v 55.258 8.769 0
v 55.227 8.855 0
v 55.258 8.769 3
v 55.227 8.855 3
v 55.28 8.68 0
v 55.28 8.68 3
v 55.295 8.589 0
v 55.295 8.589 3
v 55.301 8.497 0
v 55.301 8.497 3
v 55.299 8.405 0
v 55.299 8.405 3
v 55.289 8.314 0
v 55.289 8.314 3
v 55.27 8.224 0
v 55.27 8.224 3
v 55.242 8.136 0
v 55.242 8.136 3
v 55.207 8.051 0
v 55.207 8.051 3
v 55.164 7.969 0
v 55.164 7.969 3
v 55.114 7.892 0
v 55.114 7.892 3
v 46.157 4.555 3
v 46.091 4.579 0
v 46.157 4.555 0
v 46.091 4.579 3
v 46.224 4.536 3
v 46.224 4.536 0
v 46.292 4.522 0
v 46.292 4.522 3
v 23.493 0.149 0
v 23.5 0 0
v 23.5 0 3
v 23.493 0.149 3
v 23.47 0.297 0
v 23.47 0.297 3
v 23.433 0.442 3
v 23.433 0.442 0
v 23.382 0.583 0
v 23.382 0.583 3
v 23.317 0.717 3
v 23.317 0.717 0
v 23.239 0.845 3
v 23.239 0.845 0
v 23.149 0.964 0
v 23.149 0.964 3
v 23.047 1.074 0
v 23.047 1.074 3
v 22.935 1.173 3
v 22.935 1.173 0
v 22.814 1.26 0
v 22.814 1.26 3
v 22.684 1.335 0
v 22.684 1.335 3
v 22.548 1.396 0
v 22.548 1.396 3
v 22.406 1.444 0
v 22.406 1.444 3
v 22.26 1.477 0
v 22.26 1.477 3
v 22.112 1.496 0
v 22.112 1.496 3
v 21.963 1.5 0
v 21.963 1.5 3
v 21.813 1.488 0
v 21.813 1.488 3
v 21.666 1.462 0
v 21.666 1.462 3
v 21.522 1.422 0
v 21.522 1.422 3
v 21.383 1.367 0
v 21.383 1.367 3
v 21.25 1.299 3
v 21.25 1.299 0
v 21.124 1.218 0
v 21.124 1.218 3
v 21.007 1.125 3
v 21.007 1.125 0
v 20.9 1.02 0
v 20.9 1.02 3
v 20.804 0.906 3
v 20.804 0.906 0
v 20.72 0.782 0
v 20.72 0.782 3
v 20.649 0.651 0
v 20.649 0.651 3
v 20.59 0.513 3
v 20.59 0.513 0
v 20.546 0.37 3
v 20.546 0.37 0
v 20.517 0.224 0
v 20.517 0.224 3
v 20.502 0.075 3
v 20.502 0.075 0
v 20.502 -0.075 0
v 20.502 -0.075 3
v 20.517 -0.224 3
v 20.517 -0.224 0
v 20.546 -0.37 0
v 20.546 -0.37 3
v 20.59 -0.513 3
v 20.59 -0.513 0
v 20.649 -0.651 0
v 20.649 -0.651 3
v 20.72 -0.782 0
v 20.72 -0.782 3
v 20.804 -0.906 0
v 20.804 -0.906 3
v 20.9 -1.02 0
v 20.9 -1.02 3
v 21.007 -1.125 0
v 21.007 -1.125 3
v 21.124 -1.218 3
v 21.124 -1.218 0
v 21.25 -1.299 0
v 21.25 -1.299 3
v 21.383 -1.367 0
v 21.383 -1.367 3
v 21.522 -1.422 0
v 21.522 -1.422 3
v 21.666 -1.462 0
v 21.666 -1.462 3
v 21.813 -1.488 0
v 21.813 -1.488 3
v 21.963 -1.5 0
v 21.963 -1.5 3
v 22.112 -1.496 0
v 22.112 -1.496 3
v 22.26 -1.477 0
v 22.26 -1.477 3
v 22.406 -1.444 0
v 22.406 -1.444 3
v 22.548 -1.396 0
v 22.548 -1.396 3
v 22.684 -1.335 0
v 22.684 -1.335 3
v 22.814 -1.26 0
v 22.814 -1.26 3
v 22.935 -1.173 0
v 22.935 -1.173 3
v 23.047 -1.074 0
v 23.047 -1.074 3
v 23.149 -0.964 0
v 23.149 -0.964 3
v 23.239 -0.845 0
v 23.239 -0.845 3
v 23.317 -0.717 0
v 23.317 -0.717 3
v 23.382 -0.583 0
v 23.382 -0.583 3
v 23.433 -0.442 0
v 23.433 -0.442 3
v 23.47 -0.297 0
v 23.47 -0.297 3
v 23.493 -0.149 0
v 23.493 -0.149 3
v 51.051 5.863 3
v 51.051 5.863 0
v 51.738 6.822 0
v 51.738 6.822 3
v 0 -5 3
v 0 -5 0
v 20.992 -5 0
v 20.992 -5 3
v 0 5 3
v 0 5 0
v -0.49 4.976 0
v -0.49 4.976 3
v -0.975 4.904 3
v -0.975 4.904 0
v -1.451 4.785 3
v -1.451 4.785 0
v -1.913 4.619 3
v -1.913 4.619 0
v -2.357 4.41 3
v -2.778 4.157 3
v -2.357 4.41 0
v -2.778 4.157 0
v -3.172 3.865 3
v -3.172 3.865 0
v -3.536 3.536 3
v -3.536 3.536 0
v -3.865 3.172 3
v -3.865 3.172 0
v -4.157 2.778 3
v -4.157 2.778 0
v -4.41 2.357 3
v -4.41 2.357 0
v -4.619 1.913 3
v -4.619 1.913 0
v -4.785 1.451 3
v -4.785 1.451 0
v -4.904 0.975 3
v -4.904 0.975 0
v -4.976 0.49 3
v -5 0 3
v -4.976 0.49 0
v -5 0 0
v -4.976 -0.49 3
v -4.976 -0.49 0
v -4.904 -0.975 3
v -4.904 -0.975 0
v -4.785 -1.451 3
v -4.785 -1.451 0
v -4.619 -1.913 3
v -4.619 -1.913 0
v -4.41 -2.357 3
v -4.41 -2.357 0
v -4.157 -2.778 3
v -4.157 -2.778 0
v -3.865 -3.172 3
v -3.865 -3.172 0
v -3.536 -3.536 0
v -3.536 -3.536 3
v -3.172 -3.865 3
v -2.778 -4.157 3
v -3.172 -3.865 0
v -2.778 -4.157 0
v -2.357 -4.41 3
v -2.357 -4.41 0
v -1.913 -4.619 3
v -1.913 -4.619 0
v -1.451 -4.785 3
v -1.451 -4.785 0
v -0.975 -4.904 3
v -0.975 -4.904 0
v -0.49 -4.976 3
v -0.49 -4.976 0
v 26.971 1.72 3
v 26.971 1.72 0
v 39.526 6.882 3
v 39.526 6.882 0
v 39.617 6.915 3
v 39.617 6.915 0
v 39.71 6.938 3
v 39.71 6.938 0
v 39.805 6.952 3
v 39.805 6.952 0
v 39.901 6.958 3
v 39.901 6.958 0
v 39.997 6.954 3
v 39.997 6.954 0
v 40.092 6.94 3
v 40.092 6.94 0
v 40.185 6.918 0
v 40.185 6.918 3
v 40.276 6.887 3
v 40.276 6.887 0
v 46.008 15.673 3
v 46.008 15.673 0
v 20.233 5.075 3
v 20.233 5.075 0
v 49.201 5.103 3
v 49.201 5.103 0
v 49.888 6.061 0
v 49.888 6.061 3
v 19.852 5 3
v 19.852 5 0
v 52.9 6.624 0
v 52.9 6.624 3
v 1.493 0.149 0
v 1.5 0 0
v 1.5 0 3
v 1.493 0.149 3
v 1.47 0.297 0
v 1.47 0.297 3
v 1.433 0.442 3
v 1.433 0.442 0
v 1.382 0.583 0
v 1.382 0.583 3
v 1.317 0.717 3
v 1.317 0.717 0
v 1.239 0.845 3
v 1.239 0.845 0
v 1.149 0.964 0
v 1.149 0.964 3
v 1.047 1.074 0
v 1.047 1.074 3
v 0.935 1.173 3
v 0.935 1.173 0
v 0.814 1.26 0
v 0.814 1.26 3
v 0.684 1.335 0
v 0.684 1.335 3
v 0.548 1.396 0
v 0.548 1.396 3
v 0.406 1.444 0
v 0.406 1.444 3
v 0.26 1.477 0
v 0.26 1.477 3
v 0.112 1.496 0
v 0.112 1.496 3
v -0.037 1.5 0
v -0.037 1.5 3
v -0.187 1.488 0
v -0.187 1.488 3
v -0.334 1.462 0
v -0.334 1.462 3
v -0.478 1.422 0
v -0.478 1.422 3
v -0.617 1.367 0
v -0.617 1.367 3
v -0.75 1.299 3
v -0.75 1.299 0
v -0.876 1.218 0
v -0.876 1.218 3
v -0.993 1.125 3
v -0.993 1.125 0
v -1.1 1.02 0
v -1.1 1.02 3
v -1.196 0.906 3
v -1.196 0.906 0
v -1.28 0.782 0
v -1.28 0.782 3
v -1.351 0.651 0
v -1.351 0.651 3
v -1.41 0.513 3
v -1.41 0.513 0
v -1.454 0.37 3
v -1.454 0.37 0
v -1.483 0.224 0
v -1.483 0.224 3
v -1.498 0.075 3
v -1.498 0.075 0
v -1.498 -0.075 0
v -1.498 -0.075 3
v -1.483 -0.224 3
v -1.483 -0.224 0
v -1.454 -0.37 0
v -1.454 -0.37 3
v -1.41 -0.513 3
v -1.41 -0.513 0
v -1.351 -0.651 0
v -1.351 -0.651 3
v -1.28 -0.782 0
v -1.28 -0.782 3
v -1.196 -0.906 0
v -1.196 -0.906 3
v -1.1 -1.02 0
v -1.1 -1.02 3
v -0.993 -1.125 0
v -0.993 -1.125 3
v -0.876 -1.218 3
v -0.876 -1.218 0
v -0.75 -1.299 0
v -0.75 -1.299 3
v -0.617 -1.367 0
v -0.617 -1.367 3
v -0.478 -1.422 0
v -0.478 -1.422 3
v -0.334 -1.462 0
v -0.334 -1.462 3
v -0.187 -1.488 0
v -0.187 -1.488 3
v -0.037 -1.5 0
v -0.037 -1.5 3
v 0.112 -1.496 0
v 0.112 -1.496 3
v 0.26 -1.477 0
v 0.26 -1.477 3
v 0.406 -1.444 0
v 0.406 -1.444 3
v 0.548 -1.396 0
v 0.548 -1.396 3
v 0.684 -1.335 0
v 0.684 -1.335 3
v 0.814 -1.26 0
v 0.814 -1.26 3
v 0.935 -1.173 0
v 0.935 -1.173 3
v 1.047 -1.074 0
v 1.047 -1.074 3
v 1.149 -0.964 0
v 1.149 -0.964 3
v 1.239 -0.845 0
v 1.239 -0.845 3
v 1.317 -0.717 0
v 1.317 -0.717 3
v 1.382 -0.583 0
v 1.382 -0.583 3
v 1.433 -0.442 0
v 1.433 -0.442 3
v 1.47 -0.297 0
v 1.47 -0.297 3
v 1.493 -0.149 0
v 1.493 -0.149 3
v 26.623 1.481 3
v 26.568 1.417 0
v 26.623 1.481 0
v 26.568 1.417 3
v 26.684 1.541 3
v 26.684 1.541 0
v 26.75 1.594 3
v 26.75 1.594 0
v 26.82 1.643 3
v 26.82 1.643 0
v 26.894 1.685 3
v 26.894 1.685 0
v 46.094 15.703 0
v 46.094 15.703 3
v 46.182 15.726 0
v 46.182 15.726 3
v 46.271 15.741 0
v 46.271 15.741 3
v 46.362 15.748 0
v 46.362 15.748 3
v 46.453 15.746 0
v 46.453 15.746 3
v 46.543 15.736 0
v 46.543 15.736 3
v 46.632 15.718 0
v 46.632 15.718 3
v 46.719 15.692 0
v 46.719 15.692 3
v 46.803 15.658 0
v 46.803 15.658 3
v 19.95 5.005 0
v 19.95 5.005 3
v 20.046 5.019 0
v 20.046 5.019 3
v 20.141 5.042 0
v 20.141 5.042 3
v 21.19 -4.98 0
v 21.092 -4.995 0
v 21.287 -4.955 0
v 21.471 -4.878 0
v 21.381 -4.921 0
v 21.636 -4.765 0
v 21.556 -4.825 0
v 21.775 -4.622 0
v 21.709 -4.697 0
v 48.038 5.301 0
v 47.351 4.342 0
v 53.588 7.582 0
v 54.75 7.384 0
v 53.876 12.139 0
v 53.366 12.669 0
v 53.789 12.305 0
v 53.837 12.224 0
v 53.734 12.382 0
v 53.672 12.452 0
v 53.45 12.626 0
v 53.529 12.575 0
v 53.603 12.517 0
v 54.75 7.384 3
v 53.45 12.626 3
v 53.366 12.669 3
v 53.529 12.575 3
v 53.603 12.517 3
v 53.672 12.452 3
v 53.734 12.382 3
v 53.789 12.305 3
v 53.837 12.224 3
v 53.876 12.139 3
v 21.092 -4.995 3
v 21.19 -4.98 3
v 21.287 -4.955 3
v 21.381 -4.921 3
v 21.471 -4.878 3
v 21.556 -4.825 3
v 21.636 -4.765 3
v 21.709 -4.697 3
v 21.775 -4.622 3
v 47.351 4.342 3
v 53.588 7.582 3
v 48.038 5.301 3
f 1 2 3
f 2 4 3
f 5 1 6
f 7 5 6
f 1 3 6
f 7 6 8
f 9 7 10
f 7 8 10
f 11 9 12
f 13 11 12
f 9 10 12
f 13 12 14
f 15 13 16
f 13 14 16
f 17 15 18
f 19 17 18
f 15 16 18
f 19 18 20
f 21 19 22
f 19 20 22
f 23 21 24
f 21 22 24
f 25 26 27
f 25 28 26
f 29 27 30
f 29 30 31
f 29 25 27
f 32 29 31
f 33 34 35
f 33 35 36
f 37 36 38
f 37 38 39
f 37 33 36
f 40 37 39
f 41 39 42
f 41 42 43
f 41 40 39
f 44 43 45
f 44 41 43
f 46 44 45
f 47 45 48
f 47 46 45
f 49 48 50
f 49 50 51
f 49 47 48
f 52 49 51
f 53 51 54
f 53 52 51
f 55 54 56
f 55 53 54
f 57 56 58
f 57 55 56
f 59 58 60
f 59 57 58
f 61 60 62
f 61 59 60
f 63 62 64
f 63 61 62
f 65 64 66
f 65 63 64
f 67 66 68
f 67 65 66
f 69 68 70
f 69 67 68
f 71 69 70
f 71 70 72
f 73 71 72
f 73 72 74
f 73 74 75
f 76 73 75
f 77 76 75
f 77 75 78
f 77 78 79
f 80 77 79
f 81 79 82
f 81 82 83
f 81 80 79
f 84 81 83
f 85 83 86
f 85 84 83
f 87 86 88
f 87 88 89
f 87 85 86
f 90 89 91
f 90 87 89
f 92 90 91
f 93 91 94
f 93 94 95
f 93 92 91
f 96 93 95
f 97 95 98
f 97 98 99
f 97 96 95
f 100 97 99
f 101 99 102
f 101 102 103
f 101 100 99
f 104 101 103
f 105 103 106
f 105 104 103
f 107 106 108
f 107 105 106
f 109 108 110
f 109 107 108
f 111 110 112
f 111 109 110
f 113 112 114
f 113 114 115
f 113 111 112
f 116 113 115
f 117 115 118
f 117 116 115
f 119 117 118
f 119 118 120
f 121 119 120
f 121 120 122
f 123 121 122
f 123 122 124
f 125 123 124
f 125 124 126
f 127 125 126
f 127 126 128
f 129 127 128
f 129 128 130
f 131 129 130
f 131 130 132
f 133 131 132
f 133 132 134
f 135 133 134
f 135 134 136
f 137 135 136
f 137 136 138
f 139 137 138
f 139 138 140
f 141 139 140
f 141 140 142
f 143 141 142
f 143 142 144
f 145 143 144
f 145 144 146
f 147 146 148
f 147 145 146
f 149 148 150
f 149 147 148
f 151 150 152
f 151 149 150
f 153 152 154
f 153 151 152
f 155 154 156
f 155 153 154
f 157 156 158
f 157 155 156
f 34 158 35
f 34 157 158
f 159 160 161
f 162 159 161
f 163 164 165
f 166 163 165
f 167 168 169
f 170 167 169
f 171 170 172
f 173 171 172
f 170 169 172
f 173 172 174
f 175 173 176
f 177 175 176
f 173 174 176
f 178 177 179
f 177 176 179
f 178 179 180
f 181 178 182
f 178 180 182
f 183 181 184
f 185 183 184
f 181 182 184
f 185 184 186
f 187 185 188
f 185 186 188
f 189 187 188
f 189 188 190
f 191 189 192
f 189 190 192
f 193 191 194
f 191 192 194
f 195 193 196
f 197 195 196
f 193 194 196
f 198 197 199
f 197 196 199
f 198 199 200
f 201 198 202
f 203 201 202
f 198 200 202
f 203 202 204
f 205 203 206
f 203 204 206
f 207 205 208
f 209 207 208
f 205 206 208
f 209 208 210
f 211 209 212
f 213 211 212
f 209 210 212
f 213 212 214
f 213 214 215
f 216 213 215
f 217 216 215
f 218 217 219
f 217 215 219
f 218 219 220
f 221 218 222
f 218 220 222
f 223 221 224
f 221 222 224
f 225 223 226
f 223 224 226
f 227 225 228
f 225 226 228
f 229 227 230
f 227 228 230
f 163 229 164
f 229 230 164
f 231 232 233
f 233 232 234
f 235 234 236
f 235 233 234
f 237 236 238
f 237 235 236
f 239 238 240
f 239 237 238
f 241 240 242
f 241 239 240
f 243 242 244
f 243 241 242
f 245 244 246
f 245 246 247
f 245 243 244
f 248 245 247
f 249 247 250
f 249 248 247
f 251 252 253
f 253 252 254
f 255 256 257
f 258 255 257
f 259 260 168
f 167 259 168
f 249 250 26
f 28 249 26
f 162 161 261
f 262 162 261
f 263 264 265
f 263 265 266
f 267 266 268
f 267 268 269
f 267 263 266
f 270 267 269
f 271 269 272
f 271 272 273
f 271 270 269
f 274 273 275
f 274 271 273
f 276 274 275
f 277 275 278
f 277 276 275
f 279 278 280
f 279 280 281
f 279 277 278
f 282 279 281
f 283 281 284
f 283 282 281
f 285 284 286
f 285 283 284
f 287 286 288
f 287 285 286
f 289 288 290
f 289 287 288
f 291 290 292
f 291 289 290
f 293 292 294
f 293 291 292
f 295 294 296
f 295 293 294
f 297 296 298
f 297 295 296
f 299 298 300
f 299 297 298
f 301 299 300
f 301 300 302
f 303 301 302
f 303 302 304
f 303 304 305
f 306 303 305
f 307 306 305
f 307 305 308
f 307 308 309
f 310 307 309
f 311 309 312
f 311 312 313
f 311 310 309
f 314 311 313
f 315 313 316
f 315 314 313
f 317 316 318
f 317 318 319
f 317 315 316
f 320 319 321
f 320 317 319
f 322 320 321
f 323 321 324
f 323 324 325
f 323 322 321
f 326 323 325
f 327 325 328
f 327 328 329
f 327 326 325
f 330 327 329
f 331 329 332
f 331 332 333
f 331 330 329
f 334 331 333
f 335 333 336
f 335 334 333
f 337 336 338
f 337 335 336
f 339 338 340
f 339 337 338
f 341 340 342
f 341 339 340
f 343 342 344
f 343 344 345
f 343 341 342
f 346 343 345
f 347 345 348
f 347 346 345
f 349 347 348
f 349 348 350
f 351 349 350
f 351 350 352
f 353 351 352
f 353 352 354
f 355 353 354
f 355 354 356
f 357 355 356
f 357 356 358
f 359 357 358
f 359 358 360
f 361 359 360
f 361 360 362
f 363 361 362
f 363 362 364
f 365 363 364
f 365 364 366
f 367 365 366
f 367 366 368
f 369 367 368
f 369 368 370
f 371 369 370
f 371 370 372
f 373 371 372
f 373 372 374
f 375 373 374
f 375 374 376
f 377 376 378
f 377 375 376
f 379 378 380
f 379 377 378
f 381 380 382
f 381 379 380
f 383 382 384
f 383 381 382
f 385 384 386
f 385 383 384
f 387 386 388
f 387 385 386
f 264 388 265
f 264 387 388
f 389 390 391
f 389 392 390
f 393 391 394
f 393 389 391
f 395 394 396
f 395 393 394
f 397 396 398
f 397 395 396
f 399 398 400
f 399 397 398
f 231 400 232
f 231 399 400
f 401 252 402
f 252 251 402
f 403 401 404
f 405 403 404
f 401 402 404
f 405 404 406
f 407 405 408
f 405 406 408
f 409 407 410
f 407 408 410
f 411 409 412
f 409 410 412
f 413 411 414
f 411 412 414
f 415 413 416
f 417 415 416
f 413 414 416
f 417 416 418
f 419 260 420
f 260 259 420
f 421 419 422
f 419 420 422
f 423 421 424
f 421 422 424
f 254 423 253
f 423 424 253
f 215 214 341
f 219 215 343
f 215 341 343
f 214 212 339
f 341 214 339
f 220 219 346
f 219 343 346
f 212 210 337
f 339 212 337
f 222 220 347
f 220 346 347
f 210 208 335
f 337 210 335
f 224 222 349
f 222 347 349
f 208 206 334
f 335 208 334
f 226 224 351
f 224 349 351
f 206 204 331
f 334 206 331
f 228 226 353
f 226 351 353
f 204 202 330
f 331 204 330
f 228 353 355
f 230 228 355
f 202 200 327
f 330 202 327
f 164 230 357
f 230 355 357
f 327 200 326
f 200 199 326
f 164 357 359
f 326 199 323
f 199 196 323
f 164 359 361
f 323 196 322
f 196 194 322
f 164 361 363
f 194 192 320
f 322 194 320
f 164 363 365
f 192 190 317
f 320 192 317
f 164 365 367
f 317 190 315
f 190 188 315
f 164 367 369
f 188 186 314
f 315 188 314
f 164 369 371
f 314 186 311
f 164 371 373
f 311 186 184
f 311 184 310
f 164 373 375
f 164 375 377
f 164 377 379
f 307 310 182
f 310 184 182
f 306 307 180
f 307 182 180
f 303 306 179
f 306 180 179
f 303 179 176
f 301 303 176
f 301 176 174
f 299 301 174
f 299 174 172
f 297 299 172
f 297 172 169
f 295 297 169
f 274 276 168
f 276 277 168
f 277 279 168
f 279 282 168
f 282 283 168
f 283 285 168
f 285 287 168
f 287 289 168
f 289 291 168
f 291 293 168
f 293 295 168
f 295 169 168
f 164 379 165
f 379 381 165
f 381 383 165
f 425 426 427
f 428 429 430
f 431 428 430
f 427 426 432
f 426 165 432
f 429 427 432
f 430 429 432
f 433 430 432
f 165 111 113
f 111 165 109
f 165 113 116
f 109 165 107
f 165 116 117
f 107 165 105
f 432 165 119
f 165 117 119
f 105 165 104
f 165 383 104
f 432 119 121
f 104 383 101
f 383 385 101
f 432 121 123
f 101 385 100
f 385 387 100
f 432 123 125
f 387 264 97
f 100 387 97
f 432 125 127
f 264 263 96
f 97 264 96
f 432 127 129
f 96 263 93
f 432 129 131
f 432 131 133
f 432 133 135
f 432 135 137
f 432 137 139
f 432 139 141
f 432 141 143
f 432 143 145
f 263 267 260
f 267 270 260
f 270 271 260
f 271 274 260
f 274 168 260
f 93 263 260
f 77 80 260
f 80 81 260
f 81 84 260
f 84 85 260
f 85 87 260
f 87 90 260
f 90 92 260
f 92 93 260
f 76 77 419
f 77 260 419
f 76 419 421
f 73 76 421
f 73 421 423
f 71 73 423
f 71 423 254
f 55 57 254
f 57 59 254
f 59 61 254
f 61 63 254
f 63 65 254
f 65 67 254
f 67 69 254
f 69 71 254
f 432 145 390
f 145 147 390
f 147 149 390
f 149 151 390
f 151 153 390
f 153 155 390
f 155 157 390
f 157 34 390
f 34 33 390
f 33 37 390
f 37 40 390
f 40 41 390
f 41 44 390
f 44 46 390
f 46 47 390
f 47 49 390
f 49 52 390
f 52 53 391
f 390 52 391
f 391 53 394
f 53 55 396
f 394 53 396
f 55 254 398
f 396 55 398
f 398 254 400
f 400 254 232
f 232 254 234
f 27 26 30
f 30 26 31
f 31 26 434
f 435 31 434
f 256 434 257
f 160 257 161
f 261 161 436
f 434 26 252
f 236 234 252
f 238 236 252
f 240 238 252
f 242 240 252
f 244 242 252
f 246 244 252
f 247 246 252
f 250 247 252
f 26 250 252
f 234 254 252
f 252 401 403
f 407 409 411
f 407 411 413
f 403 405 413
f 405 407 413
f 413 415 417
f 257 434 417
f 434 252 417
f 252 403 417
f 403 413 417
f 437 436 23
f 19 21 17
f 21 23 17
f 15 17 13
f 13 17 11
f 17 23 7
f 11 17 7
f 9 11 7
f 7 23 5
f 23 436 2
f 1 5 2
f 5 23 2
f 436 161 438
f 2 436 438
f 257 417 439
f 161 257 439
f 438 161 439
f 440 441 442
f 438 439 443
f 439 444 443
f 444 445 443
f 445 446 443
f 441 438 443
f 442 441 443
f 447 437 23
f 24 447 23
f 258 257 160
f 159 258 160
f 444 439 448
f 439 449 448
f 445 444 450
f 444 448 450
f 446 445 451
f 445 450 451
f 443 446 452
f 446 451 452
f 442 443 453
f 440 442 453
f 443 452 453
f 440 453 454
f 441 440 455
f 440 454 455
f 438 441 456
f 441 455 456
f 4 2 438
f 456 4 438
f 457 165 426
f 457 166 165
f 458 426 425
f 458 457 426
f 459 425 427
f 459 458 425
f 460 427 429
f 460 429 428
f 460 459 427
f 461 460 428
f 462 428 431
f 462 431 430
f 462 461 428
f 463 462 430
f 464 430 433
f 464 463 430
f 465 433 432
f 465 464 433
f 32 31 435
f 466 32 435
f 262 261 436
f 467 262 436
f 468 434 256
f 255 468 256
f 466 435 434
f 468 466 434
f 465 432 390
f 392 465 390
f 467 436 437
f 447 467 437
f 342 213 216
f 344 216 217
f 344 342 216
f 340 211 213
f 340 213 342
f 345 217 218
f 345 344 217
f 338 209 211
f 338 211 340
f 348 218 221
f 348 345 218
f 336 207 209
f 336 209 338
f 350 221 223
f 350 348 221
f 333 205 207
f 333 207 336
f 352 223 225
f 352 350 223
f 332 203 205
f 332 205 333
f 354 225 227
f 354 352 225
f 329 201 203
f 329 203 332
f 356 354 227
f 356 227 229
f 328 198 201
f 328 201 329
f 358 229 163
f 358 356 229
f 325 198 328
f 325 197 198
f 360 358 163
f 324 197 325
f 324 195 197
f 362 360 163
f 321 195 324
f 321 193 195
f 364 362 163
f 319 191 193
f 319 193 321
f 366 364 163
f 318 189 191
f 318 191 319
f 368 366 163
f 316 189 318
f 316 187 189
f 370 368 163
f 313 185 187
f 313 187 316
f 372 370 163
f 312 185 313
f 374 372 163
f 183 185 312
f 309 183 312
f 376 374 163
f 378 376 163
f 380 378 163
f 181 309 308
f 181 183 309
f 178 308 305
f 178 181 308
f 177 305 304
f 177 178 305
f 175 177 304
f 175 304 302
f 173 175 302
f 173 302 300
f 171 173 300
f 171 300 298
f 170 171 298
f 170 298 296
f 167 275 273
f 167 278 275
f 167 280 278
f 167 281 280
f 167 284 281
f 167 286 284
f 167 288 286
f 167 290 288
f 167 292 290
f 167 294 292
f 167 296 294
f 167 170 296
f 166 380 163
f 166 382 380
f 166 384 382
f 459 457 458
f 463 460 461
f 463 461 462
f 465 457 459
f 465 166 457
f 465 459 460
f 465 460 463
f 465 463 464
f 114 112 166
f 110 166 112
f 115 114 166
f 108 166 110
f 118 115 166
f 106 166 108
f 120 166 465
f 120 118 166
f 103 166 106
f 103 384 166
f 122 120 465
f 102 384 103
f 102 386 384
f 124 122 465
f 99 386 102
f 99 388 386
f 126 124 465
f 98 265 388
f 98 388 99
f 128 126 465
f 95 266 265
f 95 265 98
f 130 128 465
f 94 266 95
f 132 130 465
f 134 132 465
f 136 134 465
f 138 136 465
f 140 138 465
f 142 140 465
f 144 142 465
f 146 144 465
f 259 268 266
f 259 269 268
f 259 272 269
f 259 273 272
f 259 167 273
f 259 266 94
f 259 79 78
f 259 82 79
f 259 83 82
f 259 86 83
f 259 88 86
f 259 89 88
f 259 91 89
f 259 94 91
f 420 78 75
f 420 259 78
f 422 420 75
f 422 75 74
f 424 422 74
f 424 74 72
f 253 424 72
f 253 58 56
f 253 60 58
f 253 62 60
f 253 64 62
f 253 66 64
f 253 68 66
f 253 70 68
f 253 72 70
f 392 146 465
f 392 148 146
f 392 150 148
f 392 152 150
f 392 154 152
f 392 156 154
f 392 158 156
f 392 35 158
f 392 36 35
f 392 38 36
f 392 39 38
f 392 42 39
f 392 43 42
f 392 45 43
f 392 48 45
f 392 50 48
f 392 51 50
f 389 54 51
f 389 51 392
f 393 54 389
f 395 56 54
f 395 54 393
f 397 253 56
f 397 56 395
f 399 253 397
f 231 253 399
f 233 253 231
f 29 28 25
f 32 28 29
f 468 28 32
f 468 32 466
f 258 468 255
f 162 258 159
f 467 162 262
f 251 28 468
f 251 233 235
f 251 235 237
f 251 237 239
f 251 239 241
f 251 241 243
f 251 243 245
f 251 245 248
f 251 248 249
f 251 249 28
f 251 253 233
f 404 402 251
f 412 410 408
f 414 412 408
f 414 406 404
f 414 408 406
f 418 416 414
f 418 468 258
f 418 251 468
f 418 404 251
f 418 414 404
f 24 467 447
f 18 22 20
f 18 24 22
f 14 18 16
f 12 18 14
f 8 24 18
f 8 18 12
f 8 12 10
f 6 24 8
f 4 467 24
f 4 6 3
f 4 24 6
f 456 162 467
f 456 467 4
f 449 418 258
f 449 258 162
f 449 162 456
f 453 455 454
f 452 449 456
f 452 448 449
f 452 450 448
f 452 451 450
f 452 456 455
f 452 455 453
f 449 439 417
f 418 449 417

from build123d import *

# Parameters (mm, degrees)
SKETCH1_R           = 1.5
BOSS_EXTRUDE1_DEPTH = 3
FILLET1_R           = 1


with BuildPart() as part:
    # Sketch1 → Boss-Extrude1 (new body)
    with BuildSketch(Plane.XY):
        with BuildLine():
            Line((20.05, 5), (0, 5))
            ThreePointArc((0, 5), (-5, 0), (0, -5))
            Line((0, -5), (21.474824475, -5))
            Line((21.474824475, -5), (26.72989842, 1.621129525))
            Line((26.72989842, 1.621129525), (39.900164389, 7.036080522))
            Line((39.900164389, 7.036080522), (46.188488025, 4.540007042))
            Line((46.188488025, 4.540007042), (47.351030887, 4.342221563))
            Line((47.351030887, 4.342221563), (48.038244482, 5.300533868))
            Line((48.038244482, 5.300533868), (49.200787343, 5.102748388))
            Line((49.200787343, 5.102748388), (49.888000938, 6.061060693))
            Line((49.888000938, 6.061060693), (51.050543799, 5.863275214))
            Line((51.050543799, 5.863275214), (51.737757394, 6.821587519))
            Line((51.737757394, 6.821587519), (52.900300256, 6.623802039))
            Line((52.900300256, 6.623802039), (53.587513851, 7.582114344))
            Line((53.587513851, 7.582114344), (54.750056712, 7.384328864))
            Line((54.750056712, 7.384328864), (55.437270307, 8.34264117))
            Line((55.437270307, 8.34264117), (53.72608495, 12.504593197))
            Line((53.72608495, 12.504593197), (46.409029503, 15.837507263))
            Line((46.409029503, 15.837507263), (20.05, 5))
        make_face()
        Circle(SKETCH1_R, mode=Mode.SUBTRACT)
        with Locations((22, 0)):
            Circle(SKETCH1_R, mode=Mode.SUBTRACT)
    extrude(amount=BOSS_EXTRUDE1_DEPTH)

    # Fillet1
    fillet1_edges = [part.edges().sort_by_distance(p)[0] for p in [
        (21.474824475, -5, 1.5),
        (20.05, 5, 1.5),
        (46.409029503, 15.837507263, 1.5),
        (53.72608495, 12.504593197, 1.5),
        (55.437270307, 8.34264117, 1.5),
        (46.188488025, 4.540007042, 1.5),
        (39.900164389, 7.036080522, 1.5),
        (26.72989842, 1.621129525, 1.5),
    ]]
    fillet(fillet1_edges, radius=FILLET1_R)


solid = part.part
